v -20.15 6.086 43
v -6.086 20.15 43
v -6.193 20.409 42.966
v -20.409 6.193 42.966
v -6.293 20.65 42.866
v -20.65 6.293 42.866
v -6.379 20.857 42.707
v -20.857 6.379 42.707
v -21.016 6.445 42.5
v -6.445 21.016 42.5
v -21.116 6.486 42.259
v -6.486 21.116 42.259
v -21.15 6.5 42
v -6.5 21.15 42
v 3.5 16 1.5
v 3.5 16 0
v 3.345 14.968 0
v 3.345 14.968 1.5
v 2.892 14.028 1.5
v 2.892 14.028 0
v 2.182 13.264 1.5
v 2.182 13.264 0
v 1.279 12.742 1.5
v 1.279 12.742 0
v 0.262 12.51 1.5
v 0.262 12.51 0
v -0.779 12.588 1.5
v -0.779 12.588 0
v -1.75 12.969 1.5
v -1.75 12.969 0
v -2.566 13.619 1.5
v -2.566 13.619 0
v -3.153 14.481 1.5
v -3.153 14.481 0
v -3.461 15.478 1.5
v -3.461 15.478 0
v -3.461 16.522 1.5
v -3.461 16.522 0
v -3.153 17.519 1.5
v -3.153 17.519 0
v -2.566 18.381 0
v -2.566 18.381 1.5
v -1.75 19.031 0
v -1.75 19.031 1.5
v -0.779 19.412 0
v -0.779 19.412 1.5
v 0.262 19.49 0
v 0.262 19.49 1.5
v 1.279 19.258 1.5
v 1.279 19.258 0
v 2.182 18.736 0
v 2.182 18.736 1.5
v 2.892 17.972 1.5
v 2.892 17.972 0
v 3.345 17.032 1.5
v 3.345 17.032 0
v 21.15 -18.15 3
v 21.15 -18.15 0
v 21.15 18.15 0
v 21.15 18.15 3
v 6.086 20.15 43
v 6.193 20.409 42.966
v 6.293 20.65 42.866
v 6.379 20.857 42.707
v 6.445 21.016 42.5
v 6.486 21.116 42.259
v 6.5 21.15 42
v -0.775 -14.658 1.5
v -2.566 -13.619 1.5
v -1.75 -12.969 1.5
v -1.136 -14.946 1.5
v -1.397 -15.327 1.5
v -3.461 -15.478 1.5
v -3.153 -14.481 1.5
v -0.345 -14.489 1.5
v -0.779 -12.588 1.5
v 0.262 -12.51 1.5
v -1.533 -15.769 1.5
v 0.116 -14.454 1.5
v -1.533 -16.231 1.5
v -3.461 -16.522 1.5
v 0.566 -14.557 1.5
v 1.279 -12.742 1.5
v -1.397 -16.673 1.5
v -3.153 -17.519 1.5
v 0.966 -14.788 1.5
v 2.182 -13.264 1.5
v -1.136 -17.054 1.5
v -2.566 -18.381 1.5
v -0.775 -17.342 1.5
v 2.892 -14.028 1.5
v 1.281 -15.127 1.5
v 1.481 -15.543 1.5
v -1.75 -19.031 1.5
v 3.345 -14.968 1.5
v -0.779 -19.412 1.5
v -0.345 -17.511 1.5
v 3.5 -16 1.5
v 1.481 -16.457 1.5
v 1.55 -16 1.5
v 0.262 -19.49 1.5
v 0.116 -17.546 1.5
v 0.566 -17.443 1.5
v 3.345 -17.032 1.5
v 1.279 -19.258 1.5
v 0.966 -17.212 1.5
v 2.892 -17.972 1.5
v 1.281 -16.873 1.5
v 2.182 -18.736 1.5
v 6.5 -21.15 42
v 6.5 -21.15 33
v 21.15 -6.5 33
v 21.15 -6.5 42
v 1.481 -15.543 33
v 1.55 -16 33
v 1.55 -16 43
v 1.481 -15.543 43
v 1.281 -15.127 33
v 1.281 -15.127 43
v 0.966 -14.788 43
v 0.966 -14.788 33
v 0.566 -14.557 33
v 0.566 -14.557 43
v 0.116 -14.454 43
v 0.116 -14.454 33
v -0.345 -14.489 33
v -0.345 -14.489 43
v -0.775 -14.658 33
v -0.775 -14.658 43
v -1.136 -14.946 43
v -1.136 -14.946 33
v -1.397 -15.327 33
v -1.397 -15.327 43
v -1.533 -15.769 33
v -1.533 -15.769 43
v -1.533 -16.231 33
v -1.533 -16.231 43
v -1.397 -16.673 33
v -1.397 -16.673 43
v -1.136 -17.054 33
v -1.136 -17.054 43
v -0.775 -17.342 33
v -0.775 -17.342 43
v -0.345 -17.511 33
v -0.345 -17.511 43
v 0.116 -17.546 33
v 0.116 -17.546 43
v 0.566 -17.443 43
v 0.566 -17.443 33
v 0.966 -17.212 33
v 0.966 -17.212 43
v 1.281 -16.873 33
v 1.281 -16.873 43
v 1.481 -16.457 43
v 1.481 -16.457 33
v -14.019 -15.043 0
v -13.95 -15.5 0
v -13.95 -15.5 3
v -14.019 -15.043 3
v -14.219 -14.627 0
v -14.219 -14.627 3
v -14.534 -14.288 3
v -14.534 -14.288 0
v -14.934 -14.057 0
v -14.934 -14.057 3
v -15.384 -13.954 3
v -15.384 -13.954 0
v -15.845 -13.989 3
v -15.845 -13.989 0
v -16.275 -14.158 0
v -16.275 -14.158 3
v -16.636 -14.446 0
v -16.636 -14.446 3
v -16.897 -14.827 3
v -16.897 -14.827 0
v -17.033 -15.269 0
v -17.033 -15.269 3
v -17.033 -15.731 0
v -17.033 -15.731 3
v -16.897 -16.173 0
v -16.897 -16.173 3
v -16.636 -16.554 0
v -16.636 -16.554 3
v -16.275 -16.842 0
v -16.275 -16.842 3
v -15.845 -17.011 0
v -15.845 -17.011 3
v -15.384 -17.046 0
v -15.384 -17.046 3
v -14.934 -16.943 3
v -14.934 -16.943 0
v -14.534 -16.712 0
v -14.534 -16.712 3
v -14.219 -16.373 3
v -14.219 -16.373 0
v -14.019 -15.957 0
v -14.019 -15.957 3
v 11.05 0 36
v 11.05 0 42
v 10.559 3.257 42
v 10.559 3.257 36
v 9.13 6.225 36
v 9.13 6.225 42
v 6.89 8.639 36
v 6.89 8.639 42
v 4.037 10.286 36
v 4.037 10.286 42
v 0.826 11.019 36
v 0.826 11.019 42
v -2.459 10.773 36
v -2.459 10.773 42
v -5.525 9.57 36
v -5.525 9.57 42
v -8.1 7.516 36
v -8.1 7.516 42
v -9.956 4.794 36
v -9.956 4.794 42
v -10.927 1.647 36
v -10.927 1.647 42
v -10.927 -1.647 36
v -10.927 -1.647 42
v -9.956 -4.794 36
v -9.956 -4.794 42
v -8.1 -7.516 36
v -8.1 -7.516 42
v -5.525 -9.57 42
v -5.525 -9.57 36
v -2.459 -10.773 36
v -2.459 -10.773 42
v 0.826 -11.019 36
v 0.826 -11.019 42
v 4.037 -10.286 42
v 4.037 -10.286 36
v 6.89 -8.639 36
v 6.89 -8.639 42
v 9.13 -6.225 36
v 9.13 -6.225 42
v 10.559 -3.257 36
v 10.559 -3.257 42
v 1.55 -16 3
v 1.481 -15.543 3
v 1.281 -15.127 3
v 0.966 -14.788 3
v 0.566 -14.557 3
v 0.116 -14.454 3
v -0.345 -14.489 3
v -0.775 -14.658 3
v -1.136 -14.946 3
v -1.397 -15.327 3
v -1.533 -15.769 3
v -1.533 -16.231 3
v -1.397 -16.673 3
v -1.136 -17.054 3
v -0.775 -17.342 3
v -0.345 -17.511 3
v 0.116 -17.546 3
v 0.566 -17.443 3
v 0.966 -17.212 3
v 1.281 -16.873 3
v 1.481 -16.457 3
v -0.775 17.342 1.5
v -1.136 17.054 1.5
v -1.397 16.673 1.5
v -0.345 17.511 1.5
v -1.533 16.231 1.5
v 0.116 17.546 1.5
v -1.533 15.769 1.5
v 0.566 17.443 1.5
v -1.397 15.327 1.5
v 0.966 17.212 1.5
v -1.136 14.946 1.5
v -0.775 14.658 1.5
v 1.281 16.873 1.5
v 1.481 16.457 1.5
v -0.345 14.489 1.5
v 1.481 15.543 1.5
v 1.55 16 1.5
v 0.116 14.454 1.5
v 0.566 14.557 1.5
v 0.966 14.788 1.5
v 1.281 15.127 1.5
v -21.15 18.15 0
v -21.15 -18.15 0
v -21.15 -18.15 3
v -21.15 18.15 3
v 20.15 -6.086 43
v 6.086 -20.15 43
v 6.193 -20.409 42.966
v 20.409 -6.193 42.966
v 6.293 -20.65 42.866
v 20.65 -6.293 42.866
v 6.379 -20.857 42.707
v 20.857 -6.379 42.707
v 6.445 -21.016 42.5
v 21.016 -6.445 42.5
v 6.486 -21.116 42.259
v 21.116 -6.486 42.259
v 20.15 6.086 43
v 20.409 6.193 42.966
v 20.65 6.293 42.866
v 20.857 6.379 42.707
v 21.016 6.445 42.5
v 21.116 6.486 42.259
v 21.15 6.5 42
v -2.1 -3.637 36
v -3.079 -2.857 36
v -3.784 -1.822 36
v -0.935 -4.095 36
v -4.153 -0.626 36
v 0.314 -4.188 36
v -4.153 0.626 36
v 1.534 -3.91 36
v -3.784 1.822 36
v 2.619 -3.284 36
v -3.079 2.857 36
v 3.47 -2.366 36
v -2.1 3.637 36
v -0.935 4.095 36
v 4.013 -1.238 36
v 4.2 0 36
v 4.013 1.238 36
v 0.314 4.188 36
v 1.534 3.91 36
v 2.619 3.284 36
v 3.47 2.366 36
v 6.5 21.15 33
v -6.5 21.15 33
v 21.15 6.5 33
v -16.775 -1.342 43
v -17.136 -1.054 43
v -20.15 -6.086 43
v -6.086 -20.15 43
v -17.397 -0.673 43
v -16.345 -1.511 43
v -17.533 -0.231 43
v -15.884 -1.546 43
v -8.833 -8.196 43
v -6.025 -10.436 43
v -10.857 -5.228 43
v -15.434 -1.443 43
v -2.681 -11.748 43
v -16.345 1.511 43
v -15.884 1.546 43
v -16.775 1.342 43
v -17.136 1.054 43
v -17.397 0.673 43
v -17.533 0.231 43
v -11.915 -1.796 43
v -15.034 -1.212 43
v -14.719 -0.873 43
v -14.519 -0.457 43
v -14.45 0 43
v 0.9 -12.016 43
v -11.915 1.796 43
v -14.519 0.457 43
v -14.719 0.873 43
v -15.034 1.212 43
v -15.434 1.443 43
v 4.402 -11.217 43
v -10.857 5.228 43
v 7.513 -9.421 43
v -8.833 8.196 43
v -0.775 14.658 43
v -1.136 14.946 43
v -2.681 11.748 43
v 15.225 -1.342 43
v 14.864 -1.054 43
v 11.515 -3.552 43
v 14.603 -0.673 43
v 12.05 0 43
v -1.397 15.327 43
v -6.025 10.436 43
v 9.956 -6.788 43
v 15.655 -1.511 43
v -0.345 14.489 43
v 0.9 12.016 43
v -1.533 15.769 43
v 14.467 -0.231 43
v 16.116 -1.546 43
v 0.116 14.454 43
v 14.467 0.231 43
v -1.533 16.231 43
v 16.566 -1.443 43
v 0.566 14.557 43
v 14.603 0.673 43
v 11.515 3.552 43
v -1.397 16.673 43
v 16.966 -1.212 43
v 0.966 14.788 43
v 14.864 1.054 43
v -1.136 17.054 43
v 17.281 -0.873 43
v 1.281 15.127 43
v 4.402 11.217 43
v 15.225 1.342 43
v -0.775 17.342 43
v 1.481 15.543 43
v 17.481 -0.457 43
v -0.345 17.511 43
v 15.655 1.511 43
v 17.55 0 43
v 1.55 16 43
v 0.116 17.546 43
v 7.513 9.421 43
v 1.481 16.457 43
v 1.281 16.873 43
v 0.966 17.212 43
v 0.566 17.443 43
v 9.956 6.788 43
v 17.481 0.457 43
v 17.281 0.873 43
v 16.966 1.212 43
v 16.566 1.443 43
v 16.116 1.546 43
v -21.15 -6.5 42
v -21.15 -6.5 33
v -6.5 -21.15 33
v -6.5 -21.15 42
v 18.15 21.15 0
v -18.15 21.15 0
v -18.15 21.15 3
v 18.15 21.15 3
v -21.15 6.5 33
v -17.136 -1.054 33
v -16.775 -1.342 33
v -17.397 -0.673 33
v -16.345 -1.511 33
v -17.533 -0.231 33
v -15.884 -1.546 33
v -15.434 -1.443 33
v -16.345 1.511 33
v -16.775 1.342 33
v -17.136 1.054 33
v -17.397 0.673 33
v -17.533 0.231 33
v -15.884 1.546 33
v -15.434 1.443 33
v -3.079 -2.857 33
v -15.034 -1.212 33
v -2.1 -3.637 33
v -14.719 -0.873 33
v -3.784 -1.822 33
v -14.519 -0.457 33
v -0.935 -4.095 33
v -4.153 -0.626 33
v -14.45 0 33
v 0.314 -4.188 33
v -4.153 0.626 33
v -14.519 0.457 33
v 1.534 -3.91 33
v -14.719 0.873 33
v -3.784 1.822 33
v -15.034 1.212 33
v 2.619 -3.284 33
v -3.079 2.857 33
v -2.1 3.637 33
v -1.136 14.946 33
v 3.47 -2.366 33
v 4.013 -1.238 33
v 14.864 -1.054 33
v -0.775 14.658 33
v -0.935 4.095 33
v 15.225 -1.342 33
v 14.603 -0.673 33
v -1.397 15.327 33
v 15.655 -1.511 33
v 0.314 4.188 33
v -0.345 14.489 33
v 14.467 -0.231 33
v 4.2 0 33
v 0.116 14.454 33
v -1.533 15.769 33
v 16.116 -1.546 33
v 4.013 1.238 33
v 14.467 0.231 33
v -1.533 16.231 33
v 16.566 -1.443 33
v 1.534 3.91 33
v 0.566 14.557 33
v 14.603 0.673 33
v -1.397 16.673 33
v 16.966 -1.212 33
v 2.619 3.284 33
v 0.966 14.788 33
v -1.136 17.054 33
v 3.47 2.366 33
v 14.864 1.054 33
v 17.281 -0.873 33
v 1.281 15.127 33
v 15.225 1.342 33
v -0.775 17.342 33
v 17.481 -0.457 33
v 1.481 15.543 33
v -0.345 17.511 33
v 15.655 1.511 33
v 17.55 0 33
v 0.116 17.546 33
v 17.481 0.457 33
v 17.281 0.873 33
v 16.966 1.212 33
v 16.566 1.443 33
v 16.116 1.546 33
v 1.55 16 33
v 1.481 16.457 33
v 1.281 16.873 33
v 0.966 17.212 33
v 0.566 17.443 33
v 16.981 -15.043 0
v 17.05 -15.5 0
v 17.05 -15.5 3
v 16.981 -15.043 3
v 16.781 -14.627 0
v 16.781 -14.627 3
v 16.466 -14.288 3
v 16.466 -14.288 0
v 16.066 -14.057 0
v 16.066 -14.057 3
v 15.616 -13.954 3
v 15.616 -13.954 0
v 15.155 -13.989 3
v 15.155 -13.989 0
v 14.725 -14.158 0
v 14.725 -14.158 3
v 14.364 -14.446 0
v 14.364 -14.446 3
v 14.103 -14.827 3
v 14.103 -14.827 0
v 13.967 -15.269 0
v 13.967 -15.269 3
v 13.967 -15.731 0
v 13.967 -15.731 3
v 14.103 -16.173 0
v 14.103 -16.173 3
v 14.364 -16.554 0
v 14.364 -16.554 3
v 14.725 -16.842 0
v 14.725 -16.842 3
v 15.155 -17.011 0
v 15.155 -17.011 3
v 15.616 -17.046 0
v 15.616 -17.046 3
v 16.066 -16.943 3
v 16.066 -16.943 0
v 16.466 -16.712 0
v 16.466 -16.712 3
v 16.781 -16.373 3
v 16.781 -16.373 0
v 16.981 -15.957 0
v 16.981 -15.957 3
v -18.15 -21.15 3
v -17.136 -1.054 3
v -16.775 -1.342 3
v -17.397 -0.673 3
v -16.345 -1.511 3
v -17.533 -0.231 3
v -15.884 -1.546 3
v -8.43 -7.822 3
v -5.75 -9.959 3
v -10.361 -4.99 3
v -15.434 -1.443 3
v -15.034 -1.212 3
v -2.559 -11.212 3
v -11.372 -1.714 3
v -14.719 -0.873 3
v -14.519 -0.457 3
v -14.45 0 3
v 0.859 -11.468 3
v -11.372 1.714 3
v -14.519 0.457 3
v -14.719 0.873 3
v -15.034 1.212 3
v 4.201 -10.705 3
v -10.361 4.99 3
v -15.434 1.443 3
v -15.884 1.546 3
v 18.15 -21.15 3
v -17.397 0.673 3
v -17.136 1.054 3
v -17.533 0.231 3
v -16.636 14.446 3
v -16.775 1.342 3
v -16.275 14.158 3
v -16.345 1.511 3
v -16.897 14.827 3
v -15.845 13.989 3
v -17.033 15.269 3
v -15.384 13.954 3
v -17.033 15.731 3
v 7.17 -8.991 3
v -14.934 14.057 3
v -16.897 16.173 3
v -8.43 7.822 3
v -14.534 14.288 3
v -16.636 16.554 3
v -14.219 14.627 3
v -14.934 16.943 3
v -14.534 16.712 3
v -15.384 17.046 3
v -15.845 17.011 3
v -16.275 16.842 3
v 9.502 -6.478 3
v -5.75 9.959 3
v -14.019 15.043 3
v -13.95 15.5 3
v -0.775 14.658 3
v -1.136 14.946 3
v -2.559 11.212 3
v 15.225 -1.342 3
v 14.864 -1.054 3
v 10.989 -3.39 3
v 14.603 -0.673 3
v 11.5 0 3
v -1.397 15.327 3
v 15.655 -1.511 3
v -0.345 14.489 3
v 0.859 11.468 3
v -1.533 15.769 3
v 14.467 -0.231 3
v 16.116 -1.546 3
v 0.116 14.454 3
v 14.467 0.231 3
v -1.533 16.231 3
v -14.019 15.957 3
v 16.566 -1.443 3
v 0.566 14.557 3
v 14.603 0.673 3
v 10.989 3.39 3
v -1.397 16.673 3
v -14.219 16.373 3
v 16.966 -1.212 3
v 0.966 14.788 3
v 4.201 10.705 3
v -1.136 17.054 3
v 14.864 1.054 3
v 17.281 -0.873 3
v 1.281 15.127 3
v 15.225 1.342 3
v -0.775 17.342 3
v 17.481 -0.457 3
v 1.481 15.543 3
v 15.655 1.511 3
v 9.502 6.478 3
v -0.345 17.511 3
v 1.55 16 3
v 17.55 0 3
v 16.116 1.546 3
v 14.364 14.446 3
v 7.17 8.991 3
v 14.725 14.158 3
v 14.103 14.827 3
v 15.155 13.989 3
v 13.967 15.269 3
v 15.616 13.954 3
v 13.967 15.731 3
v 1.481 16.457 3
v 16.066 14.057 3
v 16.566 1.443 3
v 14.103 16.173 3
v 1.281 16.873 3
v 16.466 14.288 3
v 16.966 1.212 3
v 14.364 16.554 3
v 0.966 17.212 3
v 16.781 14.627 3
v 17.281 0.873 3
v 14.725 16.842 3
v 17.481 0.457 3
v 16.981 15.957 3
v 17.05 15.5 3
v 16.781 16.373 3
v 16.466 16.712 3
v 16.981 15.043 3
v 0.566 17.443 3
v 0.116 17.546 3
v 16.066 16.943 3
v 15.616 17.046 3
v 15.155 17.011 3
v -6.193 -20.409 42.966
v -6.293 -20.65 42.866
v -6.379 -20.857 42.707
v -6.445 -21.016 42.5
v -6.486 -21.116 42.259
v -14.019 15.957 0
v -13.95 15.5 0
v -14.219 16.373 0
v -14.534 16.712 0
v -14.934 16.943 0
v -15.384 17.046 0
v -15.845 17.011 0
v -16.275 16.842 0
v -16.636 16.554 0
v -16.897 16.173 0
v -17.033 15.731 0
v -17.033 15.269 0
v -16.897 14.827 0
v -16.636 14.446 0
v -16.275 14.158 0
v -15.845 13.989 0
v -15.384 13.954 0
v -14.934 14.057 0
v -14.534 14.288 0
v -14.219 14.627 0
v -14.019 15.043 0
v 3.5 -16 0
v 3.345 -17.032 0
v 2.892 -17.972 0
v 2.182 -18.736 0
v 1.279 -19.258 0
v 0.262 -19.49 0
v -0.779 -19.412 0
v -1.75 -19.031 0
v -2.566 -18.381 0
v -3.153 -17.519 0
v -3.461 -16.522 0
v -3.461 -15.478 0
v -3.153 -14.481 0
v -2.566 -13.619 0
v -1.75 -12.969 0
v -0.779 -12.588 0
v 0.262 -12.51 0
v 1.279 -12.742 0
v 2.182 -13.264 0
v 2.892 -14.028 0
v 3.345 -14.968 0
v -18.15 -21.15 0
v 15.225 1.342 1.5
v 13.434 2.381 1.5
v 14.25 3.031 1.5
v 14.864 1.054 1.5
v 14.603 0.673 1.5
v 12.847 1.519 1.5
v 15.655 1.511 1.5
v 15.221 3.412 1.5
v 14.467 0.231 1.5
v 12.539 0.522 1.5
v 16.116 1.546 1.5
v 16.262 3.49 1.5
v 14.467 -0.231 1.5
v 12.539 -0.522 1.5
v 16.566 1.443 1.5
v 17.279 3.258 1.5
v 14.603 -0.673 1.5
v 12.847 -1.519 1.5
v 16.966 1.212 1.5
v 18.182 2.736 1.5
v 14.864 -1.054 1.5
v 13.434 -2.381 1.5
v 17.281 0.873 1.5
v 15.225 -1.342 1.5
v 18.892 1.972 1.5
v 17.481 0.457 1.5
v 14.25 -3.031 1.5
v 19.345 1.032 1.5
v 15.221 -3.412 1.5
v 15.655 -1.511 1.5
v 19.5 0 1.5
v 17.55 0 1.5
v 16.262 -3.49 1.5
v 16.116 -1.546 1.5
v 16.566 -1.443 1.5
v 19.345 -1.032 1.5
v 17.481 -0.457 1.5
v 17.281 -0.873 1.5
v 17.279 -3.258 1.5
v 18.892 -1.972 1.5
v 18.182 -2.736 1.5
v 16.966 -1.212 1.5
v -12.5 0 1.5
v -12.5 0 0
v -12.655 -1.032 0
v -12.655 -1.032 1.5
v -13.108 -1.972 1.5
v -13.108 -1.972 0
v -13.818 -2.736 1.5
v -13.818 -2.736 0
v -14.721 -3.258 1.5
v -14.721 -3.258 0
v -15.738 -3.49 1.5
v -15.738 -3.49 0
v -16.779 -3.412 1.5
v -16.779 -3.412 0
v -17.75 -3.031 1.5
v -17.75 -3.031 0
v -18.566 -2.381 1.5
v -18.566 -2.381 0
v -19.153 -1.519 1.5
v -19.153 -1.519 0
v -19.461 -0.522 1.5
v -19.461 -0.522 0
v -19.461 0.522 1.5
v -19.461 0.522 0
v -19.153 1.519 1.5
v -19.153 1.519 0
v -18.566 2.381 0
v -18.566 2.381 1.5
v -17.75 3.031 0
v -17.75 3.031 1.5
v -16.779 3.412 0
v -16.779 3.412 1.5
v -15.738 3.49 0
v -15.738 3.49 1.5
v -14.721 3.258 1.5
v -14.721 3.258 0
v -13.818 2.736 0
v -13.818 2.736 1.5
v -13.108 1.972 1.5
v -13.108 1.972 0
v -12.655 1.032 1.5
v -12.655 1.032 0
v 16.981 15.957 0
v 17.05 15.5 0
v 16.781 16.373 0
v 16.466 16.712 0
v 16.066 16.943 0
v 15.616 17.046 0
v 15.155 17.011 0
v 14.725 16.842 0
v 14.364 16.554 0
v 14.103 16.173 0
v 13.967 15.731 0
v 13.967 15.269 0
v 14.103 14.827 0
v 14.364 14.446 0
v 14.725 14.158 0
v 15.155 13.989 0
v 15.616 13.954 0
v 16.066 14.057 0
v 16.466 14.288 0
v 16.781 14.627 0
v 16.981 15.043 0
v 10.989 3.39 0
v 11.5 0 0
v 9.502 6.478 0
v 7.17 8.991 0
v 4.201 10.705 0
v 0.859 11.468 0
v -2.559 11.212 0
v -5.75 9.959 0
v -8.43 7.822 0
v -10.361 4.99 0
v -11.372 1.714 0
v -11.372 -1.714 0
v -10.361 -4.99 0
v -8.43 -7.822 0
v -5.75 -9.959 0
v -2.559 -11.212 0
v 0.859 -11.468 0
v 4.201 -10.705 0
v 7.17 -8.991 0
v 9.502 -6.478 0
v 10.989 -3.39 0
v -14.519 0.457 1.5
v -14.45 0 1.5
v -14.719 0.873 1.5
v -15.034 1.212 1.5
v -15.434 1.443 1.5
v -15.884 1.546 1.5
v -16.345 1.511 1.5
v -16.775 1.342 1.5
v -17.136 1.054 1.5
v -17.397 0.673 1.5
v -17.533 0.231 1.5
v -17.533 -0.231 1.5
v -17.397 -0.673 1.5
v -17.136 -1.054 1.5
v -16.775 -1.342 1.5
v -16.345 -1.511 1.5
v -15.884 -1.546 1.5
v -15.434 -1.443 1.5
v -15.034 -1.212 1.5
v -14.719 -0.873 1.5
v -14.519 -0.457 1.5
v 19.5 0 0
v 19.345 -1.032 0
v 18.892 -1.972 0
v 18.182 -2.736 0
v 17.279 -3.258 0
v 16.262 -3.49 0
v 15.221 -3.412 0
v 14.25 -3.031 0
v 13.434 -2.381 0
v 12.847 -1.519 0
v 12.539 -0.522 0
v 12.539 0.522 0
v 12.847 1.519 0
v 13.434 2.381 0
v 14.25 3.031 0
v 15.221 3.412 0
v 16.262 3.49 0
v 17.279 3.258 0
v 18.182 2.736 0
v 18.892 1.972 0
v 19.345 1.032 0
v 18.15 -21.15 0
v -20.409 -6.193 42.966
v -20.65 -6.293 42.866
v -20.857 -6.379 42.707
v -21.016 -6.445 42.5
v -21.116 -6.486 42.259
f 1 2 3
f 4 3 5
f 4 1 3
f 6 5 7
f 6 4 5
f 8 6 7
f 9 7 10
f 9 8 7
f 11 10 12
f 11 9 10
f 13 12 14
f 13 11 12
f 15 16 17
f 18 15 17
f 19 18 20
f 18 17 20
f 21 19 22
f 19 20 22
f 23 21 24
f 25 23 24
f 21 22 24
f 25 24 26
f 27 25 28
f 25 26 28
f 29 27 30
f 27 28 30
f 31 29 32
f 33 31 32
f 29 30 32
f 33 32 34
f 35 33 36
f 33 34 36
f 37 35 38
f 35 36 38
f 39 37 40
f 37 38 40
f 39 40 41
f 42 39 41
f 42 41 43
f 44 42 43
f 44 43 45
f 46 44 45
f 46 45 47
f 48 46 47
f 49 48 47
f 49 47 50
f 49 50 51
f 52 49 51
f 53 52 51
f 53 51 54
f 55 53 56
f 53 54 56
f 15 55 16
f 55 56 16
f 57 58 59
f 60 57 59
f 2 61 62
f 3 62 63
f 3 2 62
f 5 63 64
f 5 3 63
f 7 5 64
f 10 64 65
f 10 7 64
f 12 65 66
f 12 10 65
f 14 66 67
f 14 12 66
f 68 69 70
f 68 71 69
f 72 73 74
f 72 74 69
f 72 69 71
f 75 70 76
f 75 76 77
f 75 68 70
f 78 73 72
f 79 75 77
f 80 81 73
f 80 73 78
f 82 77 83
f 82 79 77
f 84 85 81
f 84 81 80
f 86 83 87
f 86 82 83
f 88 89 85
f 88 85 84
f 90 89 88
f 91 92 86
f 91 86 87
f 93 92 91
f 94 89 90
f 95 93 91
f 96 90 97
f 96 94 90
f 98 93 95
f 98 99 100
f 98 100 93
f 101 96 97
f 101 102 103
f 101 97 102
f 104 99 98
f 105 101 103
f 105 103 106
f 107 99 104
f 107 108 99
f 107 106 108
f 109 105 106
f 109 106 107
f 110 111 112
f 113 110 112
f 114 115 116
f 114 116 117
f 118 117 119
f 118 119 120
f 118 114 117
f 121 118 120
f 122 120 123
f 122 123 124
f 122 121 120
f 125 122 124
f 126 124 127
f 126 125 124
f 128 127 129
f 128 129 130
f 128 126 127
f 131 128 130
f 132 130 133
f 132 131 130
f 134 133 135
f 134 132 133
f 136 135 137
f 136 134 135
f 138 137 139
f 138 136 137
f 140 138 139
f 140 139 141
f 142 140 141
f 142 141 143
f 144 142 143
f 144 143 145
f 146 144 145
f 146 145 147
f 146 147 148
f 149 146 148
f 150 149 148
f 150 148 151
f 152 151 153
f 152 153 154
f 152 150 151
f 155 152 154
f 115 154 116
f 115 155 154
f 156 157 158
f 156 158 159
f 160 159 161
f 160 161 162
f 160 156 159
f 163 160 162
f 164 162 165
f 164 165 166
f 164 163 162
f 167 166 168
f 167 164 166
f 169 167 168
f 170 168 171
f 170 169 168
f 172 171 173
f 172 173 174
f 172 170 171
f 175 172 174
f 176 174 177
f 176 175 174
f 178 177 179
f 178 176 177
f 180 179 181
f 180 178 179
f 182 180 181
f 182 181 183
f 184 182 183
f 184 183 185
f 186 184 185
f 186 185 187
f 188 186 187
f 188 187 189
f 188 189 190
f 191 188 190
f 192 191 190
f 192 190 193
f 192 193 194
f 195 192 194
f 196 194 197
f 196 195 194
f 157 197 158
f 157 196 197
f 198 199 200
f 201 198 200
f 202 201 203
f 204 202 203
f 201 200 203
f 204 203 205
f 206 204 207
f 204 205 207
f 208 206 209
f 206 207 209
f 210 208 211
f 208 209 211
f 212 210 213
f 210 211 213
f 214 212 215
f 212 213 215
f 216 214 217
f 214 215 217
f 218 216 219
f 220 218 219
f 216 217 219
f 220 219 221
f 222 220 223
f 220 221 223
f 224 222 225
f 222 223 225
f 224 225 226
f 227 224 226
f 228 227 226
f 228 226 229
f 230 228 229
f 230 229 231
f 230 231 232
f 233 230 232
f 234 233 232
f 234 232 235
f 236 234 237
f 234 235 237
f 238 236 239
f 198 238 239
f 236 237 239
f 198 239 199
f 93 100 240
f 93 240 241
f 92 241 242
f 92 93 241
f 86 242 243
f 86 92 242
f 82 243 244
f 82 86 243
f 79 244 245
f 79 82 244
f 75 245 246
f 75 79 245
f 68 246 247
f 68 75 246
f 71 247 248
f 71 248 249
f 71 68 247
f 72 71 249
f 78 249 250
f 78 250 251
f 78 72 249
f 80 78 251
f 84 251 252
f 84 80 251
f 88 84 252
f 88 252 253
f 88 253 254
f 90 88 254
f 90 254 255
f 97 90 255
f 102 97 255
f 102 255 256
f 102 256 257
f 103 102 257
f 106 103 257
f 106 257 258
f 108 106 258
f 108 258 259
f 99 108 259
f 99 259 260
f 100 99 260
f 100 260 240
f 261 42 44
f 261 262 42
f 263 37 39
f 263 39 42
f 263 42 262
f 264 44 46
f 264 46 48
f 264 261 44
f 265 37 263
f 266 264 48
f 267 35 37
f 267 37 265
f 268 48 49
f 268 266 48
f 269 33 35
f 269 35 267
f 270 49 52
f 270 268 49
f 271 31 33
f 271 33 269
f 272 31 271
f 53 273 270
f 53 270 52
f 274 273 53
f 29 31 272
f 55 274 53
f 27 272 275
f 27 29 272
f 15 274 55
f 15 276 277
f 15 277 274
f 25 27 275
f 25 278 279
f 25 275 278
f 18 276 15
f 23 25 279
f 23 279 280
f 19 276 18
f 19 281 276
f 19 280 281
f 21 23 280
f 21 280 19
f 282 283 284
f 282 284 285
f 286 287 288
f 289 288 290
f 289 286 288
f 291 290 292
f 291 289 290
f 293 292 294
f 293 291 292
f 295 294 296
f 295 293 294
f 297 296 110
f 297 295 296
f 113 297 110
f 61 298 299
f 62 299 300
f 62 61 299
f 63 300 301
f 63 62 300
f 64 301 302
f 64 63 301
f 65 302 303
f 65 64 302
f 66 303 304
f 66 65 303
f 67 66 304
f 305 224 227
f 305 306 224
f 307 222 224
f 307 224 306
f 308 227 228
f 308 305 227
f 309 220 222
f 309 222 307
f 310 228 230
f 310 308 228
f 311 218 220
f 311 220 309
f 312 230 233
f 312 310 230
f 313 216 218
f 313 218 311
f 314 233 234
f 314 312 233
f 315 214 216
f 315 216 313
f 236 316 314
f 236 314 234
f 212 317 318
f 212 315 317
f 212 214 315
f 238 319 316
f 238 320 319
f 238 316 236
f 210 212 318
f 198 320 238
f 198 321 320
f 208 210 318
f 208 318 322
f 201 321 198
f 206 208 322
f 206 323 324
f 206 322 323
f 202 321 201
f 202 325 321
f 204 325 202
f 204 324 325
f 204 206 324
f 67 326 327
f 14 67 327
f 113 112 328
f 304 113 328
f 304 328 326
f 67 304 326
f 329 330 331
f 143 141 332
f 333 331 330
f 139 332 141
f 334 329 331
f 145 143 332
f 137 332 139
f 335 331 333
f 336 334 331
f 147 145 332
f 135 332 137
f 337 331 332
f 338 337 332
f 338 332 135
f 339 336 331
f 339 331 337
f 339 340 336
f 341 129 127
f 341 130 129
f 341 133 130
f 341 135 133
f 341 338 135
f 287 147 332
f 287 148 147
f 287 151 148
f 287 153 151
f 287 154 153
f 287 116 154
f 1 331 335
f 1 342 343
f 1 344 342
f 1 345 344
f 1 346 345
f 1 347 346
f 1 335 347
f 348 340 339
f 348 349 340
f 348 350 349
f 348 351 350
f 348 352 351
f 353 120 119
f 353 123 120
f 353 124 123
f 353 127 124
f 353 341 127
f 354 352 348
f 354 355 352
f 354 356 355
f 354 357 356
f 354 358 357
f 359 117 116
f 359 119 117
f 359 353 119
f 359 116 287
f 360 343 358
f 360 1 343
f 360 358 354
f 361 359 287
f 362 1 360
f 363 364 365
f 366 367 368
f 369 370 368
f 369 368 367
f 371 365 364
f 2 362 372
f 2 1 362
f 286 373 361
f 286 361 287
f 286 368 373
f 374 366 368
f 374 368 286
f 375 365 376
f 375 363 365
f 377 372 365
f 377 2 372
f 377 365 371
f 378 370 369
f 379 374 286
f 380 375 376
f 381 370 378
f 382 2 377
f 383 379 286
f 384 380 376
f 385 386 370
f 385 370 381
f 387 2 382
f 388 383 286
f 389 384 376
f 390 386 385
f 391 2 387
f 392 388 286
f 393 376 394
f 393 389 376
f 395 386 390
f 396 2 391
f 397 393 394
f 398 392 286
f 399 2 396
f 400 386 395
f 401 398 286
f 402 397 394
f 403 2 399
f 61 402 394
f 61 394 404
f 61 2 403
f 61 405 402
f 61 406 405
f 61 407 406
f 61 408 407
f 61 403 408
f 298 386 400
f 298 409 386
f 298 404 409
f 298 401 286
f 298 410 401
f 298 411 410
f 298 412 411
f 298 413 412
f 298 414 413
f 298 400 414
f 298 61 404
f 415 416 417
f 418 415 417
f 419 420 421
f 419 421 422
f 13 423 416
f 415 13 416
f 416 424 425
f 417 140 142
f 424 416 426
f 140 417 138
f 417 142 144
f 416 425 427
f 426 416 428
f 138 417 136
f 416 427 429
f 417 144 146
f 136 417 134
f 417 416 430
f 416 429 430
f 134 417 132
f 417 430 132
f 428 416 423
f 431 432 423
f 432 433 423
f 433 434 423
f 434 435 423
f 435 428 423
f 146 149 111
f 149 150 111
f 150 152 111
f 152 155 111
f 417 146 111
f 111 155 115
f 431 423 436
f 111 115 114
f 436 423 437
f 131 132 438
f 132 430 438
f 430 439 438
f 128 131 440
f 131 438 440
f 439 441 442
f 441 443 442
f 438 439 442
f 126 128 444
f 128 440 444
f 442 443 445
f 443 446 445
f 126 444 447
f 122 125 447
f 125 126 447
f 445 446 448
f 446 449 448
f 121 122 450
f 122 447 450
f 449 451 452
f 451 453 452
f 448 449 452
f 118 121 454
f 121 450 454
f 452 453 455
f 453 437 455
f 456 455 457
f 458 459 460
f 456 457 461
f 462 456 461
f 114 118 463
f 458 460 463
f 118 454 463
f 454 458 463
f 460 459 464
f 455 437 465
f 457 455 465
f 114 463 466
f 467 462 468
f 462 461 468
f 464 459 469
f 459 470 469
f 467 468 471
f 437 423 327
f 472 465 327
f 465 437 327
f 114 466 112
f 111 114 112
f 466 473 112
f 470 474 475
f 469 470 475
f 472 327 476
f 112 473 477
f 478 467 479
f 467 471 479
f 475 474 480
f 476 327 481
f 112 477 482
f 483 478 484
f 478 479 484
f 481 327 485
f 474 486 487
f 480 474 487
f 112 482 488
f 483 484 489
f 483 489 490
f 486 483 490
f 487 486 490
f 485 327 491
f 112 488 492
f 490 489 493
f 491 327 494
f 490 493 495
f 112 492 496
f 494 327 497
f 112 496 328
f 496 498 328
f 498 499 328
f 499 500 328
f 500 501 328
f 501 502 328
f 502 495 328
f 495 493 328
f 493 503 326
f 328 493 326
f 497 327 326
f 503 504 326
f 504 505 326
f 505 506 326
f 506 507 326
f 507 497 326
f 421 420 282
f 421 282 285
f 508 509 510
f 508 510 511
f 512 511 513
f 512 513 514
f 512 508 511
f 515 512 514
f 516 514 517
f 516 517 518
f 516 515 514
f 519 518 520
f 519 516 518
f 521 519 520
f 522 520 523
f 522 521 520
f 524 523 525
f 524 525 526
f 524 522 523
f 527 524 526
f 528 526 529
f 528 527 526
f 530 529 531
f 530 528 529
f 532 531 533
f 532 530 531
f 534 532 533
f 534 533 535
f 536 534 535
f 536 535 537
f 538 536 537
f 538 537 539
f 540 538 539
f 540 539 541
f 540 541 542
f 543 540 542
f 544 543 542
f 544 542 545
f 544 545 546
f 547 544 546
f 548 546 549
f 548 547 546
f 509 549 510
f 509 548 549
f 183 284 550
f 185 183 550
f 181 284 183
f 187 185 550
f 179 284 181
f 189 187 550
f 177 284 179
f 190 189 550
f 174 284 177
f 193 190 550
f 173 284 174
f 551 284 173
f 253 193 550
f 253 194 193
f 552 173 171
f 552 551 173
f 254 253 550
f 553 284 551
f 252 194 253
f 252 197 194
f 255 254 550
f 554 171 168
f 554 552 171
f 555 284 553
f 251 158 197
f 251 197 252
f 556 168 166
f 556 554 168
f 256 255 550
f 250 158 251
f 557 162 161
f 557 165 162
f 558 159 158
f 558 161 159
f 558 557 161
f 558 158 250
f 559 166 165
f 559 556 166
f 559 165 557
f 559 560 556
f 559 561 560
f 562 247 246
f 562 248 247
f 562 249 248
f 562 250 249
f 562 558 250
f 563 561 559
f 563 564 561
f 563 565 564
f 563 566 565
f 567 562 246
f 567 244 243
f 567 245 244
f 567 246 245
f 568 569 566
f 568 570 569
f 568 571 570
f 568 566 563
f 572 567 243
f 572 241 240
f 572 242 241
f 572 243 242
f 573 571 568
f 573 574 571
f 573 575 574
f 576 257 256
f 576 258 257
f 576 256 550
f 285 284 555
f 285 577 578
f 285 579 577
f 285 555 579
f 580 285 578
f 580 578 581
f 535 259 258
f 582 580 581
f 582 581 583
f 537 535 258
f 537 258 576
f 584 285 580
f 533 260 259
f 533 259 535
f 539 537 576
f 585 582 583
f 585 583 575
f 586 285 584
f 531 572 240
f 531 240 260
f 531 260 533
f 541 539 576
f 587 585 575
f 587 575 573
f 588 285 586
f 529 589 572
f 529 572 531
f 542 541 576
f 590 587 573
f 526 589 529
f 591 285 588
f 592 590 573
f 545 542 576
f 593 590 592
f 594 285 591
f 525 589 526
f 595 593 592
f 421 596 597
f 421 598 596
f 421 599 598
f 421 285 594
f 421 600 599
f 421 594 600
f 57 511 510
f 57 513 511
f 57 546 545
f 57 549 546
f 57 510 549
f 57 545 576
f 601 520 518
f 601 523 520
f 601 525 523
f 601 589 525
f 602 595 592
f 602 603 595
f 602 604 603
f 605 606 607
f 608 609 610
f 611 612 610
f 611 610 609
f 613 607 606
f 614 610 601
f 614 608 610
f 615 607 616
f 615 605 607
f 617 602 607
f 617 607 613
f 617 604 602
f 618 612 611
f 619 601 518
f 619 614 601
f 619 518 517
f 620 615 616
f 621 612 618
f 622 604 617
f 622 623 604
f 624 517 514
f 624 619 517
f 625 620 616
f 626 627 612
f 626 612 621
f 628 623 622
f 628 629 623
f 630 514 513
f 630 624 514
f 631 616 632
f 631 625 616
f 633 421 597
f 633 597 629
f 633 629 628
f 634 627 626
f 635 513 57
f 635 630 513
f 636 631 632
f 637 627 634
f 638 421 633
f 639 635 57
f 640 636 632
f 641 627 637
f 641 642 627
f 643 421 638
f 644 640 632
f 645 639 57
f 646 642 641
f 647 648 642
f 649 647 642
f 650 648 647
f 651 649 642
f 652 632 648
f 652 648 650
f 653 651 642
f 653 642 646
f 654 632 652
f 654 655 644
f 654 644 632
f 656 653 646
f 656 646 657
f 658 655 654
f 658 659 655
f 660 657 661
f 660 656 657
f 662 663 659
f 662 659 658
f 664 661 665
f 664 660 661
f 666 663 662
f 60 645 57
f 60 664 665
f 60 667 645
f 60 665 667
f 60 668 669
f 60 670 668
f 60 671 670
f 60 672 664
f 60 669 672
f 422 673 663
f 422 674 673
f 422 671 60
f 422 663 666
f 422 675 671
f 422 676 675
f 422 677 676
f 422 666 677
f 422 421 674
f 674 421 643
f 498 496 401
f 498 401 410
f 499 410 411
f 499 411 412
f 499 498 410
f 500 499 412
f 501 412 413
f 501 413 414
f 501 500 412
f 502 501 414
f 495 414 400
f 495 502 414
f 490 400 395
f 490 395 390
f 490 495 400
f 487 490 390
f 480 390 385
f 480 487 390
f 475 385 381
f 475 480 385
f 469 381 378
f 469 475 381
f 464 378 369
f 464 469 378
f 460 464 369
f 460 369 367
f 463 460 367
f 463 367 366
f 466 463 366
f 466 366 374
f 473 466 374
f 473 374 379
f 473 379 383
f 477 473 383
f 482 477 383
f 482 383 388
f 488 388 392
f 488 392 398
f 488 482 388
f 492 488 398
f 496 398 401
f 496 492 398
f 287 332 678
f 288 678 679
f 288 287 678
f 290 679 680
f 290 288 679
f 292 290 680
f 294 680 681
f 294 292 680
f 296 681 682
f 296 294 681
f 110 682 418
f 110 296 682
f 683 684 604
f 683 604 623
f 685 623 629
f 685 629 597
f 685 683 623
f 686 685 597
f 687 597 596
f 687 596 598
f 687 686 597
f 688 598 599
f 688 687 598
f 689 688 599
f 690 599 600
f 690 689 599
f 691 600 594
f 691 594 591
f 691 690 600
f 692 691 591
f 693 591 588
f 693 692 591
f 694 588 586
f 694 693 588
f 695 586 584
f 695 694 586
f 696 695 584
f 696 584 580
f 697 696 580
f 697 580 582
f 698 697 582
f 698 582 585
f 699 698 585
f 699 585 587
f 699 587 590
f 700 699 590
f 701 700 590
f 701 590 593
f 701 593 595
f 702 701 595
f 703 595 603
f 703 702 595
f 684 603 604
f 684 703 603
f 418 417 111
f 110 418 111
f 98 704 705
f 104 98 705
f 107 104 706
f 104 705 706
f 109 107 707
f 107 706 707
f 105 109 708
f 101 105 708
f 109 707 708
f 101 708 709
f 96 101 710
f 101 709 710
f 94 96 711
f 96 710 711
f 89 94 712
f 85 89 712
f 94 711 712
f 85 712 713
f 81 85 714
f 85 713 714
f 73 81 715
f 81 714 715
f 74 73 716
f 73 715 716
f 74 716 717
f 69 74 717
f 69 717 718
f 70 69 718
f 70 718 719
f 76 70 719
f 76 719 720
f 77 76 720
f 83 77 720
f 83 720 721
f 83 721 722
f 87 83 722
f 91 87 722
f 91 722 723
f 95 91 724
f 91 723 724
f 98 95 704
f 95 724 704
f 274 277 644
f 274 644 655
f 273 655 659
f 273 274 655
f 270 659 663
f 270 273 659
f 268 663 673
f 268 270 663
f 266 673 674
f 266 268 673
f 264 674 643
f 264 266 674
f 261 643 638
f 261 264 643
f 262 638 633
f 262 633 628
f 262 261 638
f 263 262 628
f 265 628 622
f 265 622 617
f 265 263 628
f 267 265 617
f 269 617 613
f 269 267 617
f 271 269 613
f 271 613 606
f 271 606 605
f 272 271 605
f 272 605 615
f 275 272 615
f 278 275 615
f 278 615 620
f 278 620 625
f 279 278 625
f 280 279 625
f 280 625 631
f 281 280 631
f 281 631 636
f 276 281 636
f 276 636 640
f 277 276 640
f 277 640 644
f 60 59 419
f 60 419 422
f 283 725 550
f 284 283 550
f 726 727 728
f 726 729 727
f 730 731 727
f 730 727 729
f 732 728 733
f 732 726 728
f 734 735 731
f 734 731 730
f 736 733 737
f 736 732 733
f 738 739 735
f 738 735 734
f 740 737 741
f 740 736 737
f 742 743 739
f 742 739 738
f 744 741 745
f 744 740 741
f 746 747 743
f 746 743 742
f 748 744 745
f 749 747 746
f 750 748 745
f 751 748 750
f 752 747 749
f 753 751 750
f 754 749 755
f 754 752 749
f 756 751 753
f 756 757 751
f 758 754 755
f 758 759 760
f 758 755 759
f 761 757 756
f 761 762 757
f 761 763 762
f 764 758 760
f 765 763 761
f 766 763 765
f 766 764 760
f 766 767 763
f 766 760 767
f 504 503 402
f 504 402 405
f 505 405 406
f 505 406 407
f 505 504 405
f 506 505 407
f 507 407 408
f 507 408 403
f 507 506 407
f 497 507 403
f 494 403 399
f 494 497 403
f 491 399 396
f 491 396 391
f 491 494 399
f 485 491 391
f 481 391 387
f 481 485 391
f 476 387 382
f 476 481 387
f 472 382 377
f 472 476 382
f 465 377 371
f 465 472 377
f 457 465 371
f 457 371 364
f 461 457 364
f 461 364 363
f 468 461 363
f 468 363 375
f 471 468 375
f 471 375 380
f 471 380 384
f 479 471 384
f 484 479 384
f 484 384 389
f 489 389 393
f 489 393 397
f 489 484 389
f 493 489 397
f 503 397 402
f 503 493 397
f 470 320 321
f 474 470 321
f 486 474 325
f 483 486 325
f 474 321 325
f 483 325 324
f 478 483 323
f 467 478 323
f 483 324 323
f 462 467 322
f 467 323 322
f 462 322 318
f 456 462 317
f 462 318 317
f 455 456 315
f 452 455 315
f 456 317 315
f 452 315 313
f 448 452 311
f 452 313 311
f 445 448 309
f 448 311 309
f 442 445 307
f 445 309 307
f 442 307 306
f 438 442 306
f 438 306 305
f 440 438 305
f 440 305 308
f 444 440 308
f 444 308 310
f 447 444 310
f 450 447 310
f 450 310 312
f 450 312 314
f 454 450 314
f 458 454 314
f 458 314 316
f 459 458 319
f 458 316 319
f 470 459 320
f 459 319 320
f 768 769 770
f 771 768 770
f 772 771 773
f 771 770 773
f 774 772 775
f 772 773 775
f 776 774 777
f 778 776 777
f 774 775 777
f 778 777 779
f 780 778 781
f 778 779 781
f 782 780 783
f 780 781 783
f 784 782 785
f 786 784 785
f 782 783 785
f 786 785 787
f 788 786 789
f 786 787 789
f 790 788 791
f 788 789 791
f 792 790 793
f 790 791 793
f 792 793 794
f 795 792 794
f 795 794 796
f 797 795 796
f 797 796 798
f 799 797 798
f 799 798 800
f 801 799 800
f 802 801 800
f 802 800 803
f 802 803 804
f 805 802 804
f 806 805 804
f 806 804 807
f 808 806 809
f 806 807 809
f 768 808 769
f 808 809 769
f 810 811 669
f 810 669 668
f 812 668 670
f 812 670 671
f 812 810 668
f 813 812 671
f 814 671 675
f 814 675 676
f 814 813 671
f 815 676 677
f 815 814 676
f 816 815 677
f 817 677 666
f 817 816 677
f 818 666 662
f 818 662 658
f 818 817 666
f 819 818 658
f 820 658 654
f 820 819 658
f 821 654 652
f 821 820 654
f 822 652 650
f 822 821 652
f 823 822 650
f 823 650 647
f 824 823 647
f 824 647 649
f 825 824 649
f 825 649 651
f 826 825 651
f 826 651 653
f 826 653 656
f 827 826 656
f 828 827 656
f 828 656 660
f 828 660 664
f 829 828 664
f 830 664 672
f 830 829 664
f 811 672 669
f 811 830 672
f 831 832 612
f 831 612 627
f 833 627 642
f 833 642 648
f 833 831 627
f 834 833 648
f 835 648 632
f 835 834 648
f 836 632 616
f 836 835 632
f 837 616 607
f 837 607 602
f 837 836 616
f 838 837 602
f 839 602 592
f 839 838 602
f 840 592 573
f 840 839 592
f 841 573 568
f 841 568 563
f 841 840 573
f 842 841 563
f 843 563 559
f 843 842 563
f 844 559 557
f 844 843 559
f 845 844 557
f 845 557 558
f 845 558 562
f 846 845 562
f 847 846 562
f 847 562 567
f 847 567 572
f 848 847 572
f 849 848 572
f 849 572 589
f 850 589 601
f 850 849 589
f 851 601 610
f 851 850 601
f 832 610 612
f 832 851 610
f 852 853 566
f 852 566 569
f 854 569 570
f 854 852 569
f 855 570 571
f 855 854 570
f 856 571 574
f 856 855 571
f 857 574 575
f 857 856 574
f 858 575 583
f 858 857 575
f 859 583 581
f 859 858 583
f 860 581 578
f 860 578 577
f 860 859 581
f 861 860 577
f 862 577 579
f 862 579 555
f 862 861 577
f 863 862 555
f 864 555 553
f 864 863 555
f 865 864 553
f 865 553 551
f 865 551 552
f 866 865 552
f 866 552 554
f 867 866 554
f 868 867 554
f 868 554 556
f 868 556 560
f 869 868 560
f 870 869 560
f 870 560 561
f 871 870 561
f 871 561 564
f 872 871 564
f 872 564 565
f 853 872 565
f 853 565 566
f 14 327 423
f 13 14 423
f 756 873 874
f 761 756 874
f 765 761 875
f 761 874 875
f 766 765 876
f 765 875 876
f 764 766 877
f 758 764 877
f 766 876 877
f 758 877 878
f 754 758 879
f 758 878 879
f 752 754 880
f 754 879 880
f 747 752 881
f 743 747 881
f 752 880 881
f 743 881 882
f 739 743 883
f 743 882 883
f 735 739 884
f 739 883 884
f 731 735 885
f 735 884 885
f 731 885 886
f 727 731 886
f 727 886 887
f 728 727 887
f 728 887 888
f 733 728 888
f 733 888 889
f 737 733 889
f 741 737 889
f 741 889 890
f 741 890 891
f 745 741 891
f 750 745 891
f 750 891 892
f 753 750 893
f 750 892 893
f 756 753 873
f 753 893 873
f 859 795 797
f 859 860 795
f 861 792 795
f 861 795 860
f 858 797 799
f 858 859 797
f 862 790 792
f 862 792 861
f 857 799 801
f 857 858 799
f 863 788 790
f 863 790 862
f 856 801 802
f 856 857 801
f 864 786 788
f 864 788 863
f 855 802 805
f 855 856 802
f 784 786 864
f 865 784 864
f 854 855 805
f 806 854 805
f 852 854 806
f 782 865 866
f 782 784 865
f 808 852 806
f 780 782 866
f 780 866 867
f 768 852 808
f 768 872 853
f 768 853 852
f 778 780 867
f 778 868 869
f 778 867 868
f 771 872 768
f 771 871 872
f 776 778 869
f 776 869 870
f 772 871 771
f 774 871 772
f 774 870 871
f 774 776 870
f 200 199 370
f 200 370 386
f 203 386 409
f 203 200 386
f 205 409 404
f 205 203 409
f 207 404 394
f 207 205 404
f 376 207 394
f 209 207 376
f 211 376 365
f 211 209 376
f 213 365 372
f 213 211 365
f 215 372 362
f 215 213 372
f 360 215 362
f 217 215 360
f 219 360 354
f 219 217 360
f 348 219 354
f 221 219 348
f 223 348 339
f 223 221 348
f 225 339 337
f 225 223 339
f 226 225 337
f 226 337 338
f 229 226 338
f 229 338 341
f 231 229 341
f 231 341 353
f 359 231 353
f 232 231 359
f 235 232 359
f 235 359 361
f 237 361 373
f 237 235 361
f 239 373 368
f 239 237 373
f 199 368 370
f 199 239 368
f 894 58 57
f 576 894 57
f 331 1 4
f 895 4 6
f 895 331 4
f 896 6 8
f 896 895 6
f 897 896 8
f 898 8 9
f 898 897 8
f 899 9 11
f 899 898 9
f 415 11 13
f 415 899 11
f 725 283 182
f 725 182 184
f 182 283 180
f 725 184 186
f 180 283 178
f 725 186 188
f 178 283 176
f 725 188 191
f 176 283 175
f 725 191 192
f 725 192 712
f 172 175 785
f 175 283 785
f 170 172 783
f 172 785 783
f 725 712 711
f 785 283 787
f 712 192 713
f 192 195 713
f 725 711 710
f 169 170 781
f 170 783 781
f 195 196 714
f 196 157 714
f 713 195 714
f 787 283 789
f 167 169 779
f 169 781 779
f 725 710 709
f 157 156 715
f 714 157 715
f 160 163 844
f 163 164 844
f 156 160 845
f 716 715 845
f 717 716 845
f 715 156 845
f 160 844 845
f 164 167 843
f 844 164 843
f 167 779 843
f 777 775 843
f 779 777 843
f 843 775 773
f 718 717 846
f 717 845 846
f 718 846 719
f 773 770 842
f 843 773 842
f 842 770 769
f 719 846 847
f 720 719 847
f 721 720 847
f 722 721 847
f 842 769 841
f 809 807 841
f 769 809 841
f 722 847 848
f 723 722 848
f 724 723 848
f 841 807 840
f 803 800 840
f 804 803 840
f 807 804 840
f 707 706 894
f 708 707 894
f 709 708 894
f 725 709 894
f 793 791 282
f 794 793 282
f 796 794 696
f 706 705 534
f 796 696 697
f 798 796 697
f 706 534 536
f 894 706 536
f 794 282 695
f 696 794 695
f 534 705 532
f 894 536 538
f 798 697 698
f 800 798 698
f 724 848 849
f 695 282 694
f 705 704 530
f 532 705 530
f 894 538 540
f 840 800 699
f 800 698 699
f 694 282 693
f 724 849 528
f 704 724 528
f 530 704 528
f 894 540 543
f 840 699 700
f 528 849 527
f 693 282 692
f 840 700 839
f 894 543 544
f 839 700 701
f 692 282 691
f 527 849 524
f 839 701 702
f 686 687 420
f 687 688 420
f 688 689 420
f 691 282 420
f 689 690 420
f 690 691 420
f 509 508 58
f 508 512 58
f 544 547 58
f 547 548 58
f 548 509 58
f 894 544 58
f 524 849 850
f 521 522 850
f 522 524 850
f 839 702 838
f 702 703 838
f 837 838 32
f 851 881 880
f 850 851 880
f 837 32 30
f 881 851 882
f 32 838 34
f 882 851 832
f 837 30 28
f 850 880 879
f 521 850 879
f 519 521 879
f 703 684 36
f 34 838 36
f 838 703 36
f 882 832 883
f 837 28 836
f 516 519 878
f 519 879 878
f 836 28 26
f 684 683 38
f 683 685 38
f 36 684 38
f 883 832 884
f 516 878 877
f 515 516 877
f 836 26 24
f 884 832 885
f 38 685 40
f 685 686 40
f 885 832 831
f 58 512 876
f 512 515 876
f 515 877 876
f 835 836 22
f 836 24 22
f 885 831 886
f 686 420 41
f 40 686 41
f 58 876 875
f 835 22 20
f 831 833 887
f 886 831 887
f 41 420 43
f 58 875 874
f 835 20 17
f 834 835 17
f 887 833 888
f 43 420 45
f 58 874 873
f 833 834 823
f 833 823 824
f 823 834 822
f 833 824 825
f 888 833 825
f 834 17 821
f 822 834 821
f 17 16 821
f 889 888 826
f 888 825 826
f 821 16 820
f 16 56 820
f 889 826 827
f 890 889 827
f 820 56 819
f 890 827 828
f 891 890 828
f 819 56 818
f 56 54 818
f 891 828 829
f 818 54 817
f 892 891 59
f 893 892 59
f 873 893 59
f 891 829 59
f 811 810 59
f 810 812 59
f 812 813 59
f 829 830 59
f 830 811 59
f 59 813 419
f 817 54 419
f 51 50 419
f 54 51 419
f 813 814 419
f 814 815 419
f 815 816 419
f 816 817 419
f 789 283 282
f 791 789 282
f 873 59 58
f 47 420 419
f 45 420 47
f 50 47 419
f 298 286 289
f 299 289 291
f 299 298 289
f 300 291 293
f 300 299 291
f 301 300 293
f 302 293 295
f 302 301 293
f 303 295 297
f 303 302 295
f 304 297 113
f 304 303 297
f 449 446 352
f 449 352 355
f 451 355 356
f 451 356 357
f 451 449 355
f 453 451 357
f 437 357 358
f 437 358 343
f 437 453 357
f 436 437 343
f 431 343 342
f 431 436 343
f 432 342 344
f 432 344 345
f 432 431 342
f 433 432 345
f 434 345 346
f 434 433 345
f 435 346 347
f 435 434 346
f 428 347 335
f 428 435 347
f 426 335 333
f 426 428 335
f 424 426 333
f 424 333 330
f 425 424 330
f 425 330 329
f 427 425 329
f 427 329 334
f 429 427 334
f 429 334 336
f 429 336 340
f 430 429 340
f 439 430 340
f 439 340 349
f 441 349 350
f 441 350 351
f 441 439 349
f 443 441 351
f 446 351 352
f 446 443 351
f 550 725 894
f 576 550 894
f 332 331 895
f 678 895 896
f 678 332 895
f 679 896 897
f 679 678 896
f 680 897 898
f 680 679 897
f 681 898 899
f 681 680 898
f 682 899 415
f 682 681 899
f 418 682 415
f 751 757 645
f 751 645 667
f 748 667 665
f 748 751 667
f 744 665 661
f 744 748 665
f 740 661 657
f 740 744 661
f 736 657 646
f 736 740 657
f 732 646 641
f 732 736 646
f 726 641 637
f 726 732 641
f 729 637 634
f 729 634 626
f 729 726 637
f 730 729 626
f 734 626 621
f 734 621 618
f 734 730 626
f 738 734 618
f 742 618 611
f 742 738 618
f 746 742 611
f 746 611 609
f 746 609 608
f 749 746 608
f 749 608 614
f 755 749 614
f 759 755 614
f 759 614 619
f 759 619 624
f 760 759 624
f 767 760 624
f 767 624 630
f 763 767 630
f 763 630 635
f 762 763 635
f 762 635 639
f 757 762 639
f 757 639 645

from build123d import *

# Parameters (mm, degrees)
SKETCH_W        = 42.3
SKETCH_H        = 42.3
SKETCH_R        = 1.55
SKETCH_R_2      = 11.5
PAD_DEPTH       = 3
SKETCH001_R     = 3.5
POCKET_DEPTH    = 1.5
CHAMFER_SIZE    = 3
SKETCH002_R     = 1.55
PAD001_DEPTH    = 10
SKETCH003_R     = 11.05
POCKET001_DEPTH = 7
CHAMFER001_SIZE = 1
SKETCH004_R     = 4.2
POCKET002_DEPTH = 3
FILLET_R        = 1


with BuildPart() as grundplatte:
    # Sketch → Pad (new body)
    with BuildSketch(Plane.XY):
        Rectangle(SKETCH_W, SKETCH_H)
        with Locations((-15.5, 15.5)):
            Circle(SKETCH_R, mode=Mode.SUBTRACT)
        with Locations((15.5, 15.5)):
            Circle(SKETCH_R, mode=Mode.SUBTRACT)
        with Locations((-15.5, -15.5)):
            Circle(SKETCH_R, mode=Mode.SUBTRACT)
        with Locations((15.5, -15.5)):
            Circle(SKETCH_R, mode=Mode.SUBTRACT)
        Circle(SKETCH_R_2, mode=Mode.SUBTRACT)
        with Locations((-16, 0)):
            Circle(SKETCH_R, mode=Mode.SUBTRACT)
        with Locations((16, 0)):
            Circle(SKETCH_R, mode=Mode.SUBTRACT)
        with Locations((0, -16)):
            Circle(SKETCH_R, mode=Mode.SUBTRACT)
        with Locations((0, 16)):
            Circle(SKETCH_R, mode=Mode.SUBTRACT)
    extrude(amount=PAD_DEPTH)

    # Sketch001 → Pocket (cut)
    with BuildSketch(Plane(origin=(0, 0, 0), x_dir=(1, 0, 0), z_dir=(0, 0, -1))):
        with Locations((-16, 0)):
            Circle(SKETCH001_R)
        with Locations((16, 0)):
            Circle(SKETCH001_R)
        with Locations((0, 16)):
            Circle(SKETCH001_R)
        with Locations((0, -16)):
            Circle(SKETCH001_R)
    extrude(amount=-POCKET_DEPTH, mode=Mode.SUBTRACT)

    # Chamfer
    chamfer_edges = [grundplatte.edges().sort_by_distance(p)[0] for p in [
        (-21.15, -21.15, 1.5),
        (-21.15, 21.15, 1.5),
        (21.15, 21.15, 1.5),
        (21.15, -21.15, 1.5),
    ]]
    chamfer(chamfer_edges, length=CHAMFER_SIZE)


with BuildPart() as lagersitz:
    # Sketch002 → Pad001 (new body)
    with BuildSketch(Plane.XY.offset(33)):
        Polygon((21.15, -6.5), (21.15, 6.5), (6.5, 21.15), (-6.5, 21.15), (-21.15, 6.5), (-21.15, -6.5), (-6.5, -21.15), (6.5, -21.15), align=None)
        with Locations((-16, 0)):
            Circle(SKETCH002_R, mode=Mode.SUBTRACT)
        with Locations((0, 16)):
            Circle(SKETCH002_R, mode=Mode.SUBTRACT)
        with Locations((16, 0)):
            Circle(SKETCH002_R, mode=Mode.SUBTRACT)
        with Locations((0, -16)):
            Circle(SKETCH002_R, mode=Mode.SUBTRACT)
    extrude(amount=PAD001_DEPTH)

    # Sketch003 → Pocket001 (cut)
    with BuildSketch(Plane.XY.offset(43)):
        Circle(SKETCH003_R)
    extrude(amount=-POCKET001_DEPTH, mode=Mode.SUBTRACT)

    # Chamfer001
    chamfer001_edges = [lagersitz.edges().sort_by_distance(p)[0] for p in [
        (-11.05, 0, 43),
    ]]
    chamfer(chamfer001_edges, length=CHAMFER001_SIZE)

    # Sketch004 → Pocket002 (cut)
    with BuildSketch(Plane.XY.offset(36)):
        Circle(SKETCH004_R)
    extrude(amount=-POCKET002_DEPTH, mode=Mode.SUBTRACT)

    # Fillet
    fillet_edges = [lagersitz.edges().sort_by_distance(p)[0] for p in [
        (0, 21.15, 43),
        (-13.825, 13.825, 43),
        (13.825, 13.825, 43),
        (21.15, 0, 43),
        (13.825, -13.825, 43),
        (0, -21.15, 43),
        (-13.825, -13.825, 43),
        (-21.15, 0, 43),
    ]]
    fillet(fillet_edges, radius=FILLET_R)


solid = Compound([grundplatte.part, lagersitz.part])
